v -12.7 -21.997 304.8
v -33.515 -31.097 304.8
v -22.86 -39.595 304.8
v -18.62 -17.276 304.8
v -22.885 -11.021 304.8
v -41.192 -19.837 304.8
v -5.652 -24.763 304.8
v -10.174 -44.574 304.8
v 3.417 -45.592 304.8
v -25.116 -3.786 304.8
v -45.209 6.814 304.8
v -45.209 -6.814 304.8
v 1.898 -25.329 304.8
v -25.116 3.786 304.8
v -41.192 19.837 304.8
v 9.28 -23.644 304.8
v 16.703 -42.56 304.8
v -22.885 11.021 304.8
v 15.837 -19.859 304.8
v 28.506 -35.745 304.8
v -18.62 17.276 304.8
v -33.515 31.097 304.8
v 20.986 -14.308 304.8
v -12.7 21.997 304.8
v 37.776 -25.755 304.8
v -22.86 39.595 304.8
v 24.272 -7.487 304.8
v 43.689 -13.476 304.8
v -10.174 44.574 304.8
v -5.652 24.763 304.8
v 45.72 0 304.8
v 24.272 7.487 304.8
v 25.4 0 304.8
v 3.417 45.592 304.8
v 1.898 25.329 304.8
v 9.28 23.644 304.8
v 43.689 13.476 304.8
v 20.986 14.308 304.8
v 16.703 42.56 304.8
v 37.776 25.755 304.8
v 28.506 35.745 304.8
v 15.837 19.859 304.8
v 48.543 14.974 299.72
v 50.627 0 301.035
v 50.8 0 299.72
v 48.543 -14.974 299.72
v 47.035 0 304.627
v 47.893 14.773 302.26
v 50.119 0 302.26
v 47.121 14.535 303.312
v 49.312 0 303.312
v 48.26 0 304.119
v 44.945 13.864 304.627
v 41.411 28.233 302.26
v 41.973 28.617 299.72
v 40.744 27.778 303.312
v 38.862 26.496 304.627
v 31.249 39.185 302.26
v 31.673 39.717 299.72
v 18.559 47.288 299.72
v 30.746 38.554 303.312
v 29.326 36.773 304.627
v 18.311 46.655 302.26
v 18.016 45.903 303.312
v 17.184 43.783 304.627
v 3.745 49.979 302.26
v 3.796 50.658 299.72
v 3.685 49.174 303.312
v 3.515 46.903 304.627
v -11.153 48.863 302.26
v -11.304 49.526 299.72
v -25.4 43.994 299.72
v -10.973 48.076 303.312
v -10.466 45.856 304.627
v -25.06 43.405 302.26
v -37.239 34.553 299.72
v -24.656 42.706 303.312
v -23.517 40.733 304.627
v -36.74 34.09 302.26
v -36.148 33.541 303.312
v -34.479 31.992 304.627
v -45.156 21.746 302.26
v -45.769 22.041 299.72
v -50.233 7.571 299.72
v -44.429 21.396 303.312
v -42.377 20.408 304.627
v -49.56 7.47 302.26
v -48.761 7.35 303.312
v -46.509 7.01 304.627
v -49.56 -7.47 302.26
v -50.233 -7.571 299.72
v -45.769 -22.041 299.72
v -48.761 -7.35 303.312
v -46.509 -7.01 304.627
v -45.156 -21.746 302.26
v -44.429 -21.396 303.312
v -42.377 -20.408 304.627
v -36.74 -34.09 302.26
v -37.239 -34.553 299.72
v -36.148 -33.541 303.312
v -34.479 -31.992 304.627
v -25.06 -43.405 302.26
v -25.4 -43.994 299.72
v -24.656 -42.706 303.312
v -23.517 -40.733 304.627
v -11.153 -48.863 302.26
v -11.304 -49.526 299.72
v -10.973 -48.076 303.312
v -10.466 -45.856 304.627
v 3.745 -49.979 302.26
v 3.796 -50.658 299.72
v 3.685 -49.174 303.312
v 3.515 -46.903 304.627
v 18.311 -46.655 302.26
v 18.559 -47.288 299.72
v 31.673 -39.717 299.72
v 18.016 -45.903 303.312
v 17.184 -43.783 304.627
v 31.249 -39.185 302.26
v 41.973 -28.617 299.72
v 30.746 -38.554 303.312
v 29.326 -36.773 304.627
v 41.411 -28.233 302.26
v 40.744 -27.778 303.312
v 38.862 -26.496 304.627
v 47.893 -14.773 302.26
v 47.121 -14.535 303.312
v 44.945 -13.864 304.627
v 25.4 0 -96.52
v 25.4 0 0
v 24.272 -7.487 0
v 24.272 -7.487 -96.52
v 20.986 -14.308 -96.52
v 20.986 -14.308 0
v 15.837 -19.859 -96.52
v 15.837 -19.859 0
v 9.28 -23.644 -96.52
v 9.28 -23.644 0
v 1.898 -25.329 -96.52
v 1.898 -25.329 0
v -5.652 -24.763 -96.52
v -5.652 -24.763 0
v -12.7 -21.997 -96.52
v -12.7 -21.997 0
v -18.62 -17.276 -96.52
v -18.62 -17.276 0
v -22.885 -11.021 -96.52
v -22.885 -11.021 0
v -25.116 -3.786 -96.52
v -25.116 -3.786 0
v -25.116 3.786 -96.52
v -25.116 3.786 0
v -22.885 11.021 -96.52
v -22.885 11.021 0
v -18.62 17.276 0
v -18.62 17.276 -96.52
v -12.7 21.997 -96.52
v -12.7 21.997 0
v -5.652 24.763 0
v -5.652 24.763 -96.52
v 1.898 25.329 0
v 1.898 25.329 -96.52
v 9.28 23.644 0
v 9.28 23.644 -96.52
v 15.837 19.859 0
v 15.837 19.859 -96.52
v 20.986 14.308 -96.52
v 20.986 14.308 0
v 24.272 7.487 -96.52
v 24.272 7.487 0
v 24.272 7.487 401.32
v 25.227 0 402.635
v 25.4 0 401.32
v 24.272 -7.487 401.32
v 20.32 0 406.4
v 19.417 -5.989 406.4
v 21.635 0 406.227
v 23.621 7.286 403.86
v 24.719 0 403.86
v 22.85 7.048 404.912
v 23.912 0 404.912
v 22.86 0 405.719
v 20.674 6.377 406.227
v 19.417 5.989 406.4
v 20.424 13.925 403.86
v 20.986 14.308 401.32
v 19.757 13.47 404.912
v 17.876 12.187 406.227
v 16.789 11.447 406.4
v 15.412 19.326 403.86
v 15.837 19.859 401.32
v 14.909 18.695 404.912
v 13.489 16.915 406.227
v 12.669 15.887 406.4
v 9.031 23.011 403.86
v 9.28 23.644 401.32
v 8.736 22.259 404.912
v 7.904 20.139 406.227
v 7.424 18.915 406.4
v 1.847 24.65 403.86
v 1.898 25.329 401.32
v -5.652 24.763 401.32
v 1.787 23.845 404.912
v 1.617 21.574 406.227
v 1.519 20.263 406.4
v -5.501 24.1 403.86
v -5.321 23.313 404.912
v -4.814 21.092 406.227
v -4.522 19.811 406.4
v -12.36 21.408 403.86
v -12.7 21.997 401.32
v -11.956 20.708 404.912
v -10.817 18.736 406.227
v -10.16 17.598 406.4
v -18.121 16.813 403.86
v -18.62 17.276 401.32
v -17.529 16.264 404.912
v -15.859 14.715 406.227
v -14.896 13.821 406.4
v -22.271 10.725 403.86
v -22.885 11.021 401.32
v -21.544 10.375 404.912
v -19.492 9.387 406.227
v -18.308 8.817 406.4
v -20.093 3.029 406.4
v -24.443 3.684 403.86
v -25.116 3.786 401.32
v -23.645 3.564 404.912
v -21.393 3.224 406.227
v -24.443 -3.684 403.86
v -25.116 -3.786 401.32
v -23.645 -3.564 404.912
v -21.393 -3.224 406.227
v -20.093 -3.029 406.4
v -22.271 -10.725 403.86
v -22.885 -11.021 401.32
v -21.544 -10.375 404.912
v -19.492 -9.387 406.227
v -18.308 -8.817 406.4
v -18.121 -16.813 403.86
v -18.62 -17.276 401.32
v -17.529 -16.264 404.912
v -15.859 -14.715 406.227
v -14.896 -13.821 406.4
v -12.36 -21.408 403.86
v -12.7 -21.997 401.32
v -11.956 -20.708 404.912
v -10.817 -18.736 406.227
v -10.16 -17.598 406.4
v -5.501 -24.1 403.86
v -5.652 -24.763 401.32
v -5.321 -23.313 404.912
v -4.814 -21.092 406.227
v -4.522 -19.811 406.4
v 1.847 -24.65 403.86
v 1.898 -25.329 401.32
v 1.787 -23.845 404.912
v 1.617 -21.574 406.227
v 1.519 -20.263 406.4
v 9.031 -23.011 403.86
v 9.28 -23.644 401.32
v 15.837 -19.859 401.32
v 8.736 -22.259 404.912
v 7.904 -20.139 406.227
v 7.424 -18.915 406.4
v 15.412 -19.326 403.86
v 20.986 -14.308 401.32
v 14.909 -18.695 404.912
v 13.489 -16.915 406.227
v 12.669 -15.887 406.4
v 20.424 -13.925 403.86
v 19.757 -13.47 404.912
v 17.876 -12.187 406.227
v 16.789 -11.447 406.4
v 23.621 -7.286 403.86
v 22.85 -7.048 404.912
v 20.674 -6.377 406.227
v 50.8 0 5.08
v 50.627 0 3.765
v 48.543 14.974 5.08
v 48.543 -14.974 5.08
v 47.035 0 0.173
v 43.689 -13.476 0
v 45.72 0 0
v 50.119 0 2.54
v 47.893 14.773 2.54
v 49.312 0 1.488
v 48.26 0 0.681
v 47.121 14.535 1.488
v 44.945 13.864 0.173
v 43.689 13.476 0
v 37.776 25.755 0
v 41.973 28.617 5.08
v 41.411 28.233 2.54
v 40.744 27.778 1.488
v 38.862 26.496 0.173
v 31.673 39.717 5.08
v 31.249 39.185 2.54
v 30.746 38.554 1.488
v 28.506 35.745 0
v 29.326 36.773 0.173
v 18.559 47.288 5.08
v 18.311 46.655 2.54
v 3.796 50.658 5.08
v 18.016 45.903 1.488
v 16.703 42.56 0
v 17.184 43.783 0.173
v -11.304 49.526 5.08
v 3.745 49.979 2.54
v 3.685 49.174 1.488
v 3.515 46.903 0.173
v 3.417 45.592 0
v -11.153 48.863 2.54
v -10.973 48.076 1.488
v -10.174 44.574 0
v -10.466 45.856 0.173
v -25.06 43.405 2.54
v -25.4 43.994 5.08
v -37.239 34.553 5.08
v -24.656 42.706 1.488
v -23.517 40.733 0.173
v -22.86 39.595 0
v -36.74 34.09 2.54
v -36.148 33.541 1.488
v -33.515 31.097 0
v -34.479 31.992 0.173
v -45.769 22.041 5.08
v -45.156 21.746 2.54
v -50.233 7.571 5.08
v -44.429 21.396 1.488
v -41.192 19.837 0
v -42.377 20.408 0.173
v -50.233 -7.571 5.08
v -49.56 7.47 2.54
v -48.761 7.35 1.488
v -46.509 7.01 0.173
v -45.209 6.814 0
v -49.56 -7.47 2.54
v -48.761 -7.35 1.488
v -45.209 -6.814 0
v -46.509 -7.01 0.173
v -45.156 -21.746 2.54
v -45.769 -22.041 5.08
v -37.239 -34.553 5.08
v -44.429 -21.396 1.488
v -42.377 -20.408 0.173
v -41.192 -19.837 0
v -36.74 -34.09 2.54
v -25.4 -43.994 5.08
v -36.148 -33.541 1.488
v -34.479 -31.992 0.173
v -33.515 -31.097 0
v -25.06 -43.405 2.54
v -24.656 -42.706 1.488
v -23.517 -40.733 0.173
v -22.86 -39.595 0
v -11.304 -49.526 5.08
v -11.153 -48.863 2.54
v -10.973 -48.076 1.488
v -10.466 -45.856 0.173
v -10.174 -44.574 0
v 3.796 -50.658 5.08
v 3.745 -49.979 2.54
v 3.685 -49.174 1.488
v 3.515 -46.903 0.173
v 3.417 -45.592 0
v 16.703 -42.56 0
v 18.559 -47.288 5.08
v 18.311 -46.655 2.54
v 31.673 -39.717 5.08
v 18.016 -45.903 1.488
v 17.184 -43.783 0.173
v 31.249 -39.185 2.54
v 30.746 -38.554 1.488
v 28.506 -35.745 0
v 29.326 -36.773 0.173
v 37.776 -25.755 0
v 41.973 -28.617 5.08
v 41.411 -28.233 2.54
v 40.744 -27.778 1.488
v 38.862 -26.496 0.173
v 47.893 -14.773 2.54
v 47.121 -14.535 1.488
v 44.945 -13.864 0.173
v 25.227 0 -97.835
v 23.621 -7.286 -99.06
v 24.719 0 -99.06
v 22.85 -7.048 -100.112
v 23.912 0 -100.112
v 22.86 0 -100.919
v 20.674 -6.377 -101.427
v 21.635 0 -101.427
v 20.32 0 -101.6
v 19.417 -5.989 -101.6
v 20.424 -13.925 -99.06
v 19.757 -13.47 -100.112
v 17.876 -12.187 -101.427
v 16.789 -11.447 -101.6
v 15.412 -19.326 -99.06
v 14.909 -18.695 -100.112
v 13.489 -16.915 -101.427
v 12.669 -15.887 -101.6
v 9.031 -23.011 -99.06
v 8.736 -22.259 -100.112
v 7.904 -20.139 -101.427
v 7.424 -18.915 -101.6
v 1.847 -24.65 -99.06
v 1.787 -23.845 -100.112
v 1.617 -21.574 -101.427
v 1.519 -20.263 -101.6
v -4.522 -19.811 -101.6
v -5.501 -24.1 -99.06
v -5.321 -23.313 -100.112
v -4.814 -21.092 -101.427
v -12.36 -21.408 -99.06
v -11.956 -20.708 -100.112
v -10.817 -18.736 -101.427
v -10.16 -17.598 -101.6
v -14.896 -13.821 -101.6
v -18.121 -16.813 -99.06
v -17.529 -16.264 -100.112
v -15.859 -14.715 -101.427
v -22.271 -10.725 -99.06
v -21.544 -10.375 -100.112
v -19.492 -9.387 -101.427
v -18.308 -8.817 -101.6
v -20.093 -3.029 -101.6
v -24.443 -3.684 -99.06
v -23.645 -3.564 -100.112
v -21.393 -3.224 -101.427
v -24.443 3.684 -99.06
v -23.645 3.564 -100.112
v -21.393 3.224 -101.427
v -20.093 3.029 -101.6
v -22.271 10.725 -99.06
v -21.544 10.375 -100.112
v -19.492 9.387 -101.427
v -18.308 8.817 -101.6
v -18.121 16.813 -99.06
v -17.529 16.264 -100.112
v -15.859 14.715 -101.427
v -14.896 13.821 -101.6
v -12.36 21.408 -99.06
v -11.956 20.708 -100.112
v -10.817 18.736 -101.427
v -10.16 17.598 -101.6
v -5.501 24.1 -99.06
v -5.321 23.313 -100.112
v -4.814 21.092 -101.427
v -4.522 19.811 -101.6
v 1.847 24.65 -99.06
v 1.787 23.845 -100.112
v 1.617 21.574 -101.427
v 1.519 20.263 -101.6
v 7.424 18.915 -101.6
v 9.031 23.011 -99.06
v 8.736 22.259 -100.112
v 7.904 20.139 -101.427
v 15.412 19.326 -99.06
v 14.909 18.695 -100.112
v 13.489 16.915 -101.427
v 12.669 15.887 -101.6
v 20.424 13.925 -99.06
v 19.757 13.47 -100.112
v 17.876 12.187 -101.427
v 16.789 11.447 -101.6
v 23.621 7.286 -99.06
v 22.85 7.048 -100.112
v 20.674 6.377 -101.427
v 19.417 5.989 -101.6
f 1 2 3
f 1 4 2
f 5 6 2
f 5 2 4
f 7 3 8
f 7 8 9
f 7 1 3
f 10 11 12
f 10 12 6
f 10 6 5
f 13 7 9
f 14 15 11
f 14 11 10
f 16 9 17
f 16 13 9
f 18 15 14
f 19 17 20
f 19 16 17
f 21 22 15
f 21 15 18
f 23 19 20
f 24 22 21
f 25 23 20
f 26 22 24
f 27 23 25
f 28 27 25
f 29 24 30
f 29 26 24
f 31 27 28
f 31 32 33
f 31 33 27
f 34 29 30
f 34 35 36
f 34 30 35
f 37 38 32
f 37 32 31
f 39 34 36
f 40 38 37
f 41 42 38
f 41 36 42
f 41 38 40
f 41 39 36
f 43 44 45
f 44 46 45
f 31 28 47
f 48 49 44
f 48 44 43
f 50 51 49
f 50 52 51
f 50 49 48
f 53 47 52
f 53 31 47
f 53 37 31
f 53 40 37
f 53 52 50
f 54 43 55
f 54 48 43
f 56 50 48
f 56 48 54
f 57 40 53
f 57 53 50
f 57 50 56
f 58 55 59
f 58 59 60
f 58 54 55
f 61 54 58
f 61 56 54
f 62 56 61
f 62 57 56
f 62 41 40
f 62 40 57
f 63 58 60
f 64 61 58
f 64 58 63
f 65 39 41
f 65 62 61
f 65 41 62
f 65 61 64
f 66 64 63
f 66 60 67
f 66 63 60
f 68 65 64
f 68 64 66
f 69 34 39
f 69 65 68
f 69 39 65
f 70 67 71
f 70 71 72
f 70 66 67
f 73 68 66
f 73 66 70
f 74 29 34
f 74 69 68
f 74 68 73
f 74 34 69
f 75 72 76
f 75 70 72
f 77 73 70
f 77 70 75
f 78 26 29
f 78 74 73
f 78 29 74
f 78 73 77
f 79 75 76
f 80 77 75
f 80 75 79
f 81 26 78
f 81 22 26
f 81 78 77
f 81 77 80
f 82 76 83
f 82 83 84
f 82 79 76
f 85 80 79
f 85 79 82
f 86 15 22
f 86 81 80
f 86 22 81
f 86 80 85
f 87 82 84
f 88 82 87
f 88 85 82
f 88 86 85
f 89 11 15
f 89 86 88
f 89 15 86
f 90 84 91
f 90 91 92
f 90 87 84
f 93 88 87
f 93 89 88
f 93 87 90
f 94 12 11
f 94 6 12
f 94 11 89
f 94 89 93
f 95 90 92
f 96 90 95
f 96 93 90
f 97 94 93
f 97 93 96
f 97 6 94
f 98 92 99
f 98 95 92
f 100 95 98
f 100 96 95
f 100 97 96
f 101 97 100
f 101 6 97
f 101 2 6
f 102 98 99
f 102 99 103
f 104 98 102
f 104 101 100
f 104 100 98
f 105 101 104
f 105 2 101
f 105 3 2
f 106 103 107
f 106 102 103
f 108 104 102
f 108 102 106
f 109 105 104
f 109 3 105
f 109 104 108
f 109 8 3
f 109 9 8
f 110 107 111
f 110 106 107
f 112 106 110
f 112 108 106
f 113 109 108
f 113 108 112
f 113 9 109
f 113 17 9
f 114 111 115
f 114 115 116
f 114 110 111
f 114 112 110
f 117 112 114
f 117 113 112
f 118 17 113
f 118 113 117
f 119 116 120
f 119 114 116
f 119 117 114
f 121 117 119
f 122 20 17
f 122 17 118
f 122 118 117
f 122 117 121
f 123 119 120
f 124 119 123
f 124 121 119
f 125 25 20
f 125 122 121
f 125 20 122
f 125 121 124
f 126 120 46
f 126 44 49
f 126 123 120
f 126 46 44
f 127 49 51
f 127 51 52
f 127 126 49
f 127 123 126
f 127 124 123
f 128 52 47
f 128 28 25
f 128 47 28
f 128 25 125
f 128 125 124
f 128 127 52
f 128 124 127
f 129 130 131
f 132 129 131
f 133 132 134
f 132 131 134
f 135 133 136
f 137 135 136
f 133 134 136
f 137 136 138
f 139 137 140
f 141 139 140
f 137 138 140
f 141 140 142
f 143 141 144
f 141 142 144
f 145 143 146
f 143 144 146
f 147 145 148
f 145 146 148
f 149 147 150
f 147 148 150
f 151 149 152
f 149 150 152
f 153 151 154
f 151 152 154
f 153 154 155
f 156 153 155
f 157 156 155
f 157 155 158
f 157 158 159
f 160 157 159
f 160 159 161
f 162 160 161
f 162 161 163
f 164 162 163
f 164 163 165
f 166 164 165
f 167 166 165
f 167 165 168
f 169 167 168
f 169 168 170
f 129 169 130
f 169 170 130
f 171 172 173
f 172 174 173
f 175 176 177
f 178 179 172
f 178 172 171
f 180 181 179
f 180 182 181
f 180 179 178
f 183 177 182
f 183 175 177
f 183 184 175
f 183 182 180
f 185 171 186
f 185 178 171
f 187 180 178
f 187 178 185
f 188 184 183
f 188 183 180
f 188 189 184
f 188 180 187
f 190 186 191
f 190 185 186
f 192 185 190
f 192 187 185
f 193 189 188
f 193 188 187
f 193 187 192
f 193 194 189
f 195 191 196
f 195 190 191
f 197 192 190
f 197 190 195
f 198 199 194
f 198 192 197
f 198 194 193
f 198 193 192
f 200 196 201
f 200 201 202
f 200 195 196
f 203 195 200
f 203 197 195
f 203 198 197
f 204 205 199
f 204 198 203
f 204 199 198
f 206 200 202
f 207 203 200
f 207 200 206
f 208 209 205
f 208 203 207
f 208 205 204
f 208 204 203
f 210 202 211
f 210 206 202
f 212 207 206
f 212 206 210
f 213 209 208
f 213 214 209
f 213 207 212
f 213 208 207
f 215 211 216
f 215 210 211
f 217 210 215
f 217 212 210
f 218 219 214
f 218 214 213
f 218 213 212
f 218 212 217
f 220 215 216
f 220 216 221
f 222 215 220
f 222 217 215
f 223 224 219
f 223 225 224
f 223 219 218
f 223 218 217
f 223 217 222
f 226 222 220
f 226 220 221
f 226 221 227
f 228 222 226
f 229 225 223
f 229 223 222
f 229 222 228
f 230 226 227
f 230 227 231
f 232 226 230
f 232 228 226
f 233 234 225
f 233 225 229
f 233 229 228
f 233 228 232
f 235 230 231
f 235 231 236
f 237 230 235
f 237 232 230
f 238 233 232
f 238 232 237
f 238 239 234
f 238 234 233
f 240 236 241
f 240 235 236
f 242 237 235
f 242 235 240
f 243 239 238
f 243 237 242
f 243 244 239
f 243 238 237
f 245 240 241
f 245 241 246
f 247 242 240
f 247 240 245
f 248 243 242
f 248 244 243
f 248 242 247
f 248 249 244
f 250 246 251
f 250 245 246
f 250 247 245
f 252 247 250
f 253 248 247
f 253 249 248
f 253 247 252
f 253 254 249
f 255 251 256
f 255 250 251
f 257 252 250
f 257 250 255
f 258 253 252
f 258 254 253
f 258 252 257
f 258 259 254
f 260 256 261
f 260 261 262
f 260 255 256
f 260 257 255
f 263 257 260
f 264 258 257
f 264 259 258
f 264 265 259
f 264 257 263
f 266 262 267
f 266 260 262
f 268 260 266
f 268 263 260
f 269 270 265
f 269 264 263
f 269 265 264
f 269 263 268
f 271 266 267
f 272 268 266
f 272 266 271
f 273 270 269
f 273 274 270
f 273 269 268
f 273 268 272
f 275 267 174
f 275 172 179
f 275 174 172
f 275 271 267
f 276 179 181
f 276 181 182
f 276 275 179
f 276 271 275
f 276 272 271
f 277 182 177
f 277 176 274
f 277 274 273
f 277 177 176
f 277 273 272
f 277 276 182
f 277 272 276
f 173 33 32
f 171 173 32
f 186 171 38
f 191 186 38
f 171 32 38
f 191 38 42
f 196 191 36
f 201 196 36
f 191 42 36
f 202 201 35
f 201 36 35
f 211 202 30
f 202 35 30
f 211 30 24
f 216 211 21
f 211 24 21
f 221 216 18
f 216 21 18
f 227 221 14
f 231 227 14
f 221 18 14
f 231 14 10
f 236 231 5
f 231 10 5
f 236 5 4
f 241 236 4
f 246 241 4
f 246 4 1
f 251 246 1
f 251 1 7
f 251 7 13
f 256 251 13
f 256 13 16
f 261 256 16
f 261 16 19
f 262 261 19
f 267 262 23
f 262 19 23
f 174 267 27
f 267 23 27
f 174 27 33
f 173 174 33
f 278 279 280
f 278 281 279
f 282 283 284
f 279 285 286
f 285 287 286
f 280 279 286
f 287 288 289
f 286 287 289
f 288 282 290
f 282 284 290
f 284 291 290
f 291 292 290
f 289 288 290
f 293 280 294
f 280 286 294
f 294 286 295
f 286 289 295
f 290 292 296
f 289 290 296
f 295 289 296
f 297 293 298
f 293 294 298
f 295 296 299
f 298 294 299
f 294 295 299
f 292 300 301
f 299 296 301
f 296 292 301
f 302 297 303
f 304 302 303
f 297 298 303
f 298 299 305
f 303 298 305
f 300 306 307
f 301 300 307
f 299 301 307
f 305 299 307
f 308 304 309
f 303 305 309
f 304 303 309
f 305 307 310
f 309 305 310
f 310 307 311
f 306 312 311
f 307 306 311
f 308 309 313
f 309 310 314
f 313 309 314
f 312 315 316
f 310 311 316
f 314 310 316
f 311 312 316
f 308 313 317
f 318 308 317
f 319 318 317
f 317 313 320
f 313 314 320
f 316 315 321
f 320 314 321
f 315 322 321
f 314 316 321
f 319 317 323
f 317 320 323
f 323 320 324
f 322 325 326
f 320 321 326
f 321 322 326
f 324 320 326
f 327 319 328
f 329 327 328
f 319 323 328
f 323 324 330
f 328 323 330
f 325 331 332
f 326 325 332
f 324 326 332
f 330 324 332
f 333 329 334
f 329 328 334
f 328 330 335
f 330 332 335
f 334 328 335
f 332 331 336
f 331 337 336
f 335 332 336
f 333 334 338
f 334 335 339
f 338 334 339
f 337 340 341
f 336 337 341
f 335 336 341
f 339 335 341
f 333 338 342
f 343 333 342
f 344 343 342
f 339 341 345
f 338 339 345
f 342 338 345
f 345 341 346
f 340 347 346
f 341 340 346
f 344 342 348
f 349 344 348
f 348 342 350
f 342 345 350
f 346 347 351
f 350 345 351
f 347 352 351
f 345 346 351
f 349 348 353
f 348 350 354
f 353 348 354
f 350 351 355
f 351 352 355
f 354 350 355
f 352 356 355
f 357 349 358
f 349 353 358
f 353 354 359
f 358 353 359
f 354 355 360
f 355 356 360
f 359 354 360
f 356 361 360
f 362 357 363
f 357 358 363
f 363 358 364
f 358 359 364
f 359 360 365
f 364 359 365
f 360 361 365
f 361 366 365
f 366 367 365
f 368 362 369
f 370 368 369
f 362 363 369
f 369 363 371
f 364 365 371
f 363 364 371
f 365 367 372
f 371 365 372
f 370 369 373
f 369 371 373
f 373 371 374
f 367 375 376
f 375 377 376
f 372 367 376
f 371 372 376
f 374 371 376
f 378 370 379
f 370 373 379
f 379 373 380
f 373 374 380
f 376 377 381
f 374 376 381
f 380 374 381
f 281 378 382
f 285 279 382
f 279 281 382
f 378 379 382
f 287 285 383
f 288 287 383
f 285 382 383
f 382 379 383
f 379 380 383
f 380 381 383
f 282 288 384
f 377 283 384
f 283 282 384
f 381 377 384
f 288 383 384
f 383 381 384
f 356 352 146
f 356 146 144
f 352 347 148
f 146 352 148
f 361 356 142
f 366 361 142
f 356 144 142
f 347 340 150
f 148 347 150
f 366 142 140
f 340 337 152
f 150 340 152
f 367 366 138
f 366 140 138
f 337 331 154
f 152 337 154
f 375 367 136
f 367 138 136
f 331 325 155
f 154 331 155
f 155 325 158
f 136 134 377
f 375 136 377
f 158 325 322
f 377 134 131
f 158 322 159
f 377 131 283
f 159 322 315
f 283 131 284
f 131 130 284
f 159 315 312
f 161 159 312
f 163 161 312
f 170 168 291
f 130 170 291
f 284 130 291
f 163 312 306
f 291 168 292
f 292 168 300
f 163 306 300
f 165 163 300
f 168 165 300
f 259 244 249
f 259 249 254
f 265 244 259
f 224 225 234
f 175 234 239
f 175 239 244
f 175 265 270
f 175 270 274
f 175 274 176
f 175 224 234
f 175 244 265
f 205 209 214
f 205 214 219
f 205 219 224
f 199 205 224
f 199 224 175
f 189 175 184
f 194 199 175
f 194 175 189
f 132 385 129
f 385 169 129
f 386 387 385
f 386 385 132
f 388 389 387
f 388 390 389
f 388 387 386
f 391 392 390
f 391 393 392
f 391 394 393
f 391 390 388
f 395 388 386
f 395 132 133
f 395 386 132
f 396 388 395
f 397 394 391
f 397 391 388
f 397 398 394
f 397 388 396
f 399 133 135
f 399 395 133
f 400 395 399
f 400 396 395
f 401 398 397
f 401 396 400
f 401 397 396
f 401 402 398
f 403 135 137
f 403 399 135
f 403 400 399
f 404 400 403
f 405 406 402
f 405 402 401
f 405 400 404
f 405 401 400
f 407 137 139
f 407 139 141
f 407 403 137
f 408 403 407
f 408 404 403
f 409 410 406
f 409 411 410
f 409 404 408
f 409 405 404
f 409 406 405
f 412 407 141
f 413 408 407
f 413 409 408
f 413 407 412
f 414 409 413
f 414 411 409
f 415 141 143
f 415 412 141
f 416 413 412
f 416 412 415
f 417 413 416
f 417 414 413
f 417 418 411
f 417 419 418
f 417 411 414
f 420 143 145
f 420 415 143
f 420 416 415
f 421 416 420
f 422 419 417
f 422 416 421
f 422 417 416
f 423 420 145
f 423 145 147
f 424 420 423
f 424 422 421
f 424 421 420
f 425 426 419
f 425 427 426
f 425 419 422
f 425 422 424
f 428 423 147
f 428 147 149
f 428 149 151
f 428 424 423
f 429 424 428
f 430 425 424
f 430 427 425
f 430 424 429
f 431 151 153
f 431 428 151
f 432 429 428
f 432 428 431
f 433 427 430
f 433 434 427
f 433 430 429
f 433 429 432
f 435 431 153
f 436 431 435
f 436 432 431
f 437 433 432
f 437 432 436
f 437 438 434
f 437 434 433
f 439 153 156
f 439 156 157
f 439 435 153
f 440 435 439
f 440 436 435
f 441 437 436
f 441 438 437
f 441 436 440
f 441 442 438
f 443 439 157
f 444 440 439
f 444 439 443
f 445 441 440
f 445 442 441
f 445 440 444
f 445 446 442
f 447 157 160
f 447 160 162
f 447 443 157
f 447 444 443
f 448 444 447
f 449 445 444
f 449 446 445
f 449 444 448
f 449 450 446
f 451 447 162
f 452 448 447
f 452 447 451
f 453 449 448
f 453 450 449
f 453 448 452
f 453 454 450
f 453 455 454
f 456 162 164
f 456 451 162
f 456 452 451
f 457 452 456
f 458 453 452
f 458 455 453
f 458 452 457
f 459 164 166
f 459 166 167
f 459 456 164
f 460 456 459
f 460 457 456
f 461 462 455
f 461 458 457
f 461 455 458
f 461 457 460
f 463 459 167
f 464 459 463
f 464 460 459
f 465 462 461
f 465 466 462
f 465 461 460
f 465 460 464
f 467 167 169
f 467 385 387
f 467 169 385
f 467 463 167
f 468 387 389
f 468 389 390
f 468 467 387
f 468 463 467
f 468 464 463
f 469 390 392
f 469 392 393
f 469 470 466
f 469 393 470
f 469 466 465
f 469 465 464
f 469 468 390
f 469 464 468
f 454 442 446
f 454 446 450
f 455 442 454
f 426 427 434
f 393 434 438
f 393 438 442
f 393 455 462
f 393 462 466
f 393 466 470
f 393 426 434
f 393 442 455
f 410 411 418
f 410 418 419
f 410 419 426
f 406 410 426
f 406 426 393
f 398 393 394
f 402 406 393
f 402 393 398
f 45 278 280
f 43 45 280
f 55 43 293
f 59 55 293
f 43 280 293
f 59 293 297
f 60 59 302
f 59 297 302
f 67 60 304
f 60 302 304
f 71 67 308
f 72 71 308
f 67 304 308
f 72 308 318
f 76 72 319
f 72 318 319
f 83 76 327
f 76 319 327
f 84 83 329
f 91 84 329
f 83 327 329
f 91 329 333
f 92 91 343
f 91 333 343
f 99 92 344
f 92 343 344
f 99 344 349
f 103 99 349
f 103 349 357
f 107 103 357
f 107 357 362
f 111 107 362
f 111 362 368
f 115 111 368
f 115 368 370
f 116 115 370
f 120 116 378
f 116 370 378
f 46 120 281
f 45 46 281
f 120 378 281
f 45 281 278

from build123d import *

# Parameters (mm, degrees)
F0_R     = 50.8
F1_DEPTH = 304.8
F2_R     = 5.08
F3_R     = 5.08
F4_R     = 25.4
F5_DEPTH = 101.6
F6_R     = 5.08
F7_R     = 25.4
F8_DEPTH = 101.6
F9_R     = 5.08


with BuildPart() as f1:
    # F0 (on Top) → F1 (new body)
    with BuildSketch(Plane.XY):
        Circle(F0_R)
    extrude(amount=F1_DEPTH)

    # F2
    f2_edges = [f1.edges().sort_by_distance(p)[0] for p in [
        (-50.8, 0, 304.8),
    ]]
    fillet(f2_edges, radius=F2_R)

    # F3
    f3_edges = [f1.edges().sort_by_distance(p)[0] for p in [
        (-50.8, 0, 0),
    ]]
    fillet(f3_edges, radius=F3_R)

    # F4 (on face) → F5 (join)
    with BuildSketch(Plane(origin=(0, 0, 0), x_dir=(1, 0, 0), z_dir=(0, 0, -1))):
        Circle(F4_R)
    extrude(amount=F5_DEPTH)

    # F6
    f6_edges = [f1.edges().sort_by_distance(p)[0] for p in [
        (-25.4, 0, -101.6),
    ]]
    fillet(f6_edges, radius=F6_R)

    # F7 (on face) → F8 (join)
    with BuildSketch(Plane.XY.offset(304.8)):
        Circle(F7_R)
    extrude(amount=F8_DEPTH)

    # F9
    f9_edges = [f1.edges().sort_by_distance(p)[0] for p in [
        (-25.4, 0, 406.4),
    ]]
    fillet(f9_edges, radius=F9_R)


solid = f1.part
